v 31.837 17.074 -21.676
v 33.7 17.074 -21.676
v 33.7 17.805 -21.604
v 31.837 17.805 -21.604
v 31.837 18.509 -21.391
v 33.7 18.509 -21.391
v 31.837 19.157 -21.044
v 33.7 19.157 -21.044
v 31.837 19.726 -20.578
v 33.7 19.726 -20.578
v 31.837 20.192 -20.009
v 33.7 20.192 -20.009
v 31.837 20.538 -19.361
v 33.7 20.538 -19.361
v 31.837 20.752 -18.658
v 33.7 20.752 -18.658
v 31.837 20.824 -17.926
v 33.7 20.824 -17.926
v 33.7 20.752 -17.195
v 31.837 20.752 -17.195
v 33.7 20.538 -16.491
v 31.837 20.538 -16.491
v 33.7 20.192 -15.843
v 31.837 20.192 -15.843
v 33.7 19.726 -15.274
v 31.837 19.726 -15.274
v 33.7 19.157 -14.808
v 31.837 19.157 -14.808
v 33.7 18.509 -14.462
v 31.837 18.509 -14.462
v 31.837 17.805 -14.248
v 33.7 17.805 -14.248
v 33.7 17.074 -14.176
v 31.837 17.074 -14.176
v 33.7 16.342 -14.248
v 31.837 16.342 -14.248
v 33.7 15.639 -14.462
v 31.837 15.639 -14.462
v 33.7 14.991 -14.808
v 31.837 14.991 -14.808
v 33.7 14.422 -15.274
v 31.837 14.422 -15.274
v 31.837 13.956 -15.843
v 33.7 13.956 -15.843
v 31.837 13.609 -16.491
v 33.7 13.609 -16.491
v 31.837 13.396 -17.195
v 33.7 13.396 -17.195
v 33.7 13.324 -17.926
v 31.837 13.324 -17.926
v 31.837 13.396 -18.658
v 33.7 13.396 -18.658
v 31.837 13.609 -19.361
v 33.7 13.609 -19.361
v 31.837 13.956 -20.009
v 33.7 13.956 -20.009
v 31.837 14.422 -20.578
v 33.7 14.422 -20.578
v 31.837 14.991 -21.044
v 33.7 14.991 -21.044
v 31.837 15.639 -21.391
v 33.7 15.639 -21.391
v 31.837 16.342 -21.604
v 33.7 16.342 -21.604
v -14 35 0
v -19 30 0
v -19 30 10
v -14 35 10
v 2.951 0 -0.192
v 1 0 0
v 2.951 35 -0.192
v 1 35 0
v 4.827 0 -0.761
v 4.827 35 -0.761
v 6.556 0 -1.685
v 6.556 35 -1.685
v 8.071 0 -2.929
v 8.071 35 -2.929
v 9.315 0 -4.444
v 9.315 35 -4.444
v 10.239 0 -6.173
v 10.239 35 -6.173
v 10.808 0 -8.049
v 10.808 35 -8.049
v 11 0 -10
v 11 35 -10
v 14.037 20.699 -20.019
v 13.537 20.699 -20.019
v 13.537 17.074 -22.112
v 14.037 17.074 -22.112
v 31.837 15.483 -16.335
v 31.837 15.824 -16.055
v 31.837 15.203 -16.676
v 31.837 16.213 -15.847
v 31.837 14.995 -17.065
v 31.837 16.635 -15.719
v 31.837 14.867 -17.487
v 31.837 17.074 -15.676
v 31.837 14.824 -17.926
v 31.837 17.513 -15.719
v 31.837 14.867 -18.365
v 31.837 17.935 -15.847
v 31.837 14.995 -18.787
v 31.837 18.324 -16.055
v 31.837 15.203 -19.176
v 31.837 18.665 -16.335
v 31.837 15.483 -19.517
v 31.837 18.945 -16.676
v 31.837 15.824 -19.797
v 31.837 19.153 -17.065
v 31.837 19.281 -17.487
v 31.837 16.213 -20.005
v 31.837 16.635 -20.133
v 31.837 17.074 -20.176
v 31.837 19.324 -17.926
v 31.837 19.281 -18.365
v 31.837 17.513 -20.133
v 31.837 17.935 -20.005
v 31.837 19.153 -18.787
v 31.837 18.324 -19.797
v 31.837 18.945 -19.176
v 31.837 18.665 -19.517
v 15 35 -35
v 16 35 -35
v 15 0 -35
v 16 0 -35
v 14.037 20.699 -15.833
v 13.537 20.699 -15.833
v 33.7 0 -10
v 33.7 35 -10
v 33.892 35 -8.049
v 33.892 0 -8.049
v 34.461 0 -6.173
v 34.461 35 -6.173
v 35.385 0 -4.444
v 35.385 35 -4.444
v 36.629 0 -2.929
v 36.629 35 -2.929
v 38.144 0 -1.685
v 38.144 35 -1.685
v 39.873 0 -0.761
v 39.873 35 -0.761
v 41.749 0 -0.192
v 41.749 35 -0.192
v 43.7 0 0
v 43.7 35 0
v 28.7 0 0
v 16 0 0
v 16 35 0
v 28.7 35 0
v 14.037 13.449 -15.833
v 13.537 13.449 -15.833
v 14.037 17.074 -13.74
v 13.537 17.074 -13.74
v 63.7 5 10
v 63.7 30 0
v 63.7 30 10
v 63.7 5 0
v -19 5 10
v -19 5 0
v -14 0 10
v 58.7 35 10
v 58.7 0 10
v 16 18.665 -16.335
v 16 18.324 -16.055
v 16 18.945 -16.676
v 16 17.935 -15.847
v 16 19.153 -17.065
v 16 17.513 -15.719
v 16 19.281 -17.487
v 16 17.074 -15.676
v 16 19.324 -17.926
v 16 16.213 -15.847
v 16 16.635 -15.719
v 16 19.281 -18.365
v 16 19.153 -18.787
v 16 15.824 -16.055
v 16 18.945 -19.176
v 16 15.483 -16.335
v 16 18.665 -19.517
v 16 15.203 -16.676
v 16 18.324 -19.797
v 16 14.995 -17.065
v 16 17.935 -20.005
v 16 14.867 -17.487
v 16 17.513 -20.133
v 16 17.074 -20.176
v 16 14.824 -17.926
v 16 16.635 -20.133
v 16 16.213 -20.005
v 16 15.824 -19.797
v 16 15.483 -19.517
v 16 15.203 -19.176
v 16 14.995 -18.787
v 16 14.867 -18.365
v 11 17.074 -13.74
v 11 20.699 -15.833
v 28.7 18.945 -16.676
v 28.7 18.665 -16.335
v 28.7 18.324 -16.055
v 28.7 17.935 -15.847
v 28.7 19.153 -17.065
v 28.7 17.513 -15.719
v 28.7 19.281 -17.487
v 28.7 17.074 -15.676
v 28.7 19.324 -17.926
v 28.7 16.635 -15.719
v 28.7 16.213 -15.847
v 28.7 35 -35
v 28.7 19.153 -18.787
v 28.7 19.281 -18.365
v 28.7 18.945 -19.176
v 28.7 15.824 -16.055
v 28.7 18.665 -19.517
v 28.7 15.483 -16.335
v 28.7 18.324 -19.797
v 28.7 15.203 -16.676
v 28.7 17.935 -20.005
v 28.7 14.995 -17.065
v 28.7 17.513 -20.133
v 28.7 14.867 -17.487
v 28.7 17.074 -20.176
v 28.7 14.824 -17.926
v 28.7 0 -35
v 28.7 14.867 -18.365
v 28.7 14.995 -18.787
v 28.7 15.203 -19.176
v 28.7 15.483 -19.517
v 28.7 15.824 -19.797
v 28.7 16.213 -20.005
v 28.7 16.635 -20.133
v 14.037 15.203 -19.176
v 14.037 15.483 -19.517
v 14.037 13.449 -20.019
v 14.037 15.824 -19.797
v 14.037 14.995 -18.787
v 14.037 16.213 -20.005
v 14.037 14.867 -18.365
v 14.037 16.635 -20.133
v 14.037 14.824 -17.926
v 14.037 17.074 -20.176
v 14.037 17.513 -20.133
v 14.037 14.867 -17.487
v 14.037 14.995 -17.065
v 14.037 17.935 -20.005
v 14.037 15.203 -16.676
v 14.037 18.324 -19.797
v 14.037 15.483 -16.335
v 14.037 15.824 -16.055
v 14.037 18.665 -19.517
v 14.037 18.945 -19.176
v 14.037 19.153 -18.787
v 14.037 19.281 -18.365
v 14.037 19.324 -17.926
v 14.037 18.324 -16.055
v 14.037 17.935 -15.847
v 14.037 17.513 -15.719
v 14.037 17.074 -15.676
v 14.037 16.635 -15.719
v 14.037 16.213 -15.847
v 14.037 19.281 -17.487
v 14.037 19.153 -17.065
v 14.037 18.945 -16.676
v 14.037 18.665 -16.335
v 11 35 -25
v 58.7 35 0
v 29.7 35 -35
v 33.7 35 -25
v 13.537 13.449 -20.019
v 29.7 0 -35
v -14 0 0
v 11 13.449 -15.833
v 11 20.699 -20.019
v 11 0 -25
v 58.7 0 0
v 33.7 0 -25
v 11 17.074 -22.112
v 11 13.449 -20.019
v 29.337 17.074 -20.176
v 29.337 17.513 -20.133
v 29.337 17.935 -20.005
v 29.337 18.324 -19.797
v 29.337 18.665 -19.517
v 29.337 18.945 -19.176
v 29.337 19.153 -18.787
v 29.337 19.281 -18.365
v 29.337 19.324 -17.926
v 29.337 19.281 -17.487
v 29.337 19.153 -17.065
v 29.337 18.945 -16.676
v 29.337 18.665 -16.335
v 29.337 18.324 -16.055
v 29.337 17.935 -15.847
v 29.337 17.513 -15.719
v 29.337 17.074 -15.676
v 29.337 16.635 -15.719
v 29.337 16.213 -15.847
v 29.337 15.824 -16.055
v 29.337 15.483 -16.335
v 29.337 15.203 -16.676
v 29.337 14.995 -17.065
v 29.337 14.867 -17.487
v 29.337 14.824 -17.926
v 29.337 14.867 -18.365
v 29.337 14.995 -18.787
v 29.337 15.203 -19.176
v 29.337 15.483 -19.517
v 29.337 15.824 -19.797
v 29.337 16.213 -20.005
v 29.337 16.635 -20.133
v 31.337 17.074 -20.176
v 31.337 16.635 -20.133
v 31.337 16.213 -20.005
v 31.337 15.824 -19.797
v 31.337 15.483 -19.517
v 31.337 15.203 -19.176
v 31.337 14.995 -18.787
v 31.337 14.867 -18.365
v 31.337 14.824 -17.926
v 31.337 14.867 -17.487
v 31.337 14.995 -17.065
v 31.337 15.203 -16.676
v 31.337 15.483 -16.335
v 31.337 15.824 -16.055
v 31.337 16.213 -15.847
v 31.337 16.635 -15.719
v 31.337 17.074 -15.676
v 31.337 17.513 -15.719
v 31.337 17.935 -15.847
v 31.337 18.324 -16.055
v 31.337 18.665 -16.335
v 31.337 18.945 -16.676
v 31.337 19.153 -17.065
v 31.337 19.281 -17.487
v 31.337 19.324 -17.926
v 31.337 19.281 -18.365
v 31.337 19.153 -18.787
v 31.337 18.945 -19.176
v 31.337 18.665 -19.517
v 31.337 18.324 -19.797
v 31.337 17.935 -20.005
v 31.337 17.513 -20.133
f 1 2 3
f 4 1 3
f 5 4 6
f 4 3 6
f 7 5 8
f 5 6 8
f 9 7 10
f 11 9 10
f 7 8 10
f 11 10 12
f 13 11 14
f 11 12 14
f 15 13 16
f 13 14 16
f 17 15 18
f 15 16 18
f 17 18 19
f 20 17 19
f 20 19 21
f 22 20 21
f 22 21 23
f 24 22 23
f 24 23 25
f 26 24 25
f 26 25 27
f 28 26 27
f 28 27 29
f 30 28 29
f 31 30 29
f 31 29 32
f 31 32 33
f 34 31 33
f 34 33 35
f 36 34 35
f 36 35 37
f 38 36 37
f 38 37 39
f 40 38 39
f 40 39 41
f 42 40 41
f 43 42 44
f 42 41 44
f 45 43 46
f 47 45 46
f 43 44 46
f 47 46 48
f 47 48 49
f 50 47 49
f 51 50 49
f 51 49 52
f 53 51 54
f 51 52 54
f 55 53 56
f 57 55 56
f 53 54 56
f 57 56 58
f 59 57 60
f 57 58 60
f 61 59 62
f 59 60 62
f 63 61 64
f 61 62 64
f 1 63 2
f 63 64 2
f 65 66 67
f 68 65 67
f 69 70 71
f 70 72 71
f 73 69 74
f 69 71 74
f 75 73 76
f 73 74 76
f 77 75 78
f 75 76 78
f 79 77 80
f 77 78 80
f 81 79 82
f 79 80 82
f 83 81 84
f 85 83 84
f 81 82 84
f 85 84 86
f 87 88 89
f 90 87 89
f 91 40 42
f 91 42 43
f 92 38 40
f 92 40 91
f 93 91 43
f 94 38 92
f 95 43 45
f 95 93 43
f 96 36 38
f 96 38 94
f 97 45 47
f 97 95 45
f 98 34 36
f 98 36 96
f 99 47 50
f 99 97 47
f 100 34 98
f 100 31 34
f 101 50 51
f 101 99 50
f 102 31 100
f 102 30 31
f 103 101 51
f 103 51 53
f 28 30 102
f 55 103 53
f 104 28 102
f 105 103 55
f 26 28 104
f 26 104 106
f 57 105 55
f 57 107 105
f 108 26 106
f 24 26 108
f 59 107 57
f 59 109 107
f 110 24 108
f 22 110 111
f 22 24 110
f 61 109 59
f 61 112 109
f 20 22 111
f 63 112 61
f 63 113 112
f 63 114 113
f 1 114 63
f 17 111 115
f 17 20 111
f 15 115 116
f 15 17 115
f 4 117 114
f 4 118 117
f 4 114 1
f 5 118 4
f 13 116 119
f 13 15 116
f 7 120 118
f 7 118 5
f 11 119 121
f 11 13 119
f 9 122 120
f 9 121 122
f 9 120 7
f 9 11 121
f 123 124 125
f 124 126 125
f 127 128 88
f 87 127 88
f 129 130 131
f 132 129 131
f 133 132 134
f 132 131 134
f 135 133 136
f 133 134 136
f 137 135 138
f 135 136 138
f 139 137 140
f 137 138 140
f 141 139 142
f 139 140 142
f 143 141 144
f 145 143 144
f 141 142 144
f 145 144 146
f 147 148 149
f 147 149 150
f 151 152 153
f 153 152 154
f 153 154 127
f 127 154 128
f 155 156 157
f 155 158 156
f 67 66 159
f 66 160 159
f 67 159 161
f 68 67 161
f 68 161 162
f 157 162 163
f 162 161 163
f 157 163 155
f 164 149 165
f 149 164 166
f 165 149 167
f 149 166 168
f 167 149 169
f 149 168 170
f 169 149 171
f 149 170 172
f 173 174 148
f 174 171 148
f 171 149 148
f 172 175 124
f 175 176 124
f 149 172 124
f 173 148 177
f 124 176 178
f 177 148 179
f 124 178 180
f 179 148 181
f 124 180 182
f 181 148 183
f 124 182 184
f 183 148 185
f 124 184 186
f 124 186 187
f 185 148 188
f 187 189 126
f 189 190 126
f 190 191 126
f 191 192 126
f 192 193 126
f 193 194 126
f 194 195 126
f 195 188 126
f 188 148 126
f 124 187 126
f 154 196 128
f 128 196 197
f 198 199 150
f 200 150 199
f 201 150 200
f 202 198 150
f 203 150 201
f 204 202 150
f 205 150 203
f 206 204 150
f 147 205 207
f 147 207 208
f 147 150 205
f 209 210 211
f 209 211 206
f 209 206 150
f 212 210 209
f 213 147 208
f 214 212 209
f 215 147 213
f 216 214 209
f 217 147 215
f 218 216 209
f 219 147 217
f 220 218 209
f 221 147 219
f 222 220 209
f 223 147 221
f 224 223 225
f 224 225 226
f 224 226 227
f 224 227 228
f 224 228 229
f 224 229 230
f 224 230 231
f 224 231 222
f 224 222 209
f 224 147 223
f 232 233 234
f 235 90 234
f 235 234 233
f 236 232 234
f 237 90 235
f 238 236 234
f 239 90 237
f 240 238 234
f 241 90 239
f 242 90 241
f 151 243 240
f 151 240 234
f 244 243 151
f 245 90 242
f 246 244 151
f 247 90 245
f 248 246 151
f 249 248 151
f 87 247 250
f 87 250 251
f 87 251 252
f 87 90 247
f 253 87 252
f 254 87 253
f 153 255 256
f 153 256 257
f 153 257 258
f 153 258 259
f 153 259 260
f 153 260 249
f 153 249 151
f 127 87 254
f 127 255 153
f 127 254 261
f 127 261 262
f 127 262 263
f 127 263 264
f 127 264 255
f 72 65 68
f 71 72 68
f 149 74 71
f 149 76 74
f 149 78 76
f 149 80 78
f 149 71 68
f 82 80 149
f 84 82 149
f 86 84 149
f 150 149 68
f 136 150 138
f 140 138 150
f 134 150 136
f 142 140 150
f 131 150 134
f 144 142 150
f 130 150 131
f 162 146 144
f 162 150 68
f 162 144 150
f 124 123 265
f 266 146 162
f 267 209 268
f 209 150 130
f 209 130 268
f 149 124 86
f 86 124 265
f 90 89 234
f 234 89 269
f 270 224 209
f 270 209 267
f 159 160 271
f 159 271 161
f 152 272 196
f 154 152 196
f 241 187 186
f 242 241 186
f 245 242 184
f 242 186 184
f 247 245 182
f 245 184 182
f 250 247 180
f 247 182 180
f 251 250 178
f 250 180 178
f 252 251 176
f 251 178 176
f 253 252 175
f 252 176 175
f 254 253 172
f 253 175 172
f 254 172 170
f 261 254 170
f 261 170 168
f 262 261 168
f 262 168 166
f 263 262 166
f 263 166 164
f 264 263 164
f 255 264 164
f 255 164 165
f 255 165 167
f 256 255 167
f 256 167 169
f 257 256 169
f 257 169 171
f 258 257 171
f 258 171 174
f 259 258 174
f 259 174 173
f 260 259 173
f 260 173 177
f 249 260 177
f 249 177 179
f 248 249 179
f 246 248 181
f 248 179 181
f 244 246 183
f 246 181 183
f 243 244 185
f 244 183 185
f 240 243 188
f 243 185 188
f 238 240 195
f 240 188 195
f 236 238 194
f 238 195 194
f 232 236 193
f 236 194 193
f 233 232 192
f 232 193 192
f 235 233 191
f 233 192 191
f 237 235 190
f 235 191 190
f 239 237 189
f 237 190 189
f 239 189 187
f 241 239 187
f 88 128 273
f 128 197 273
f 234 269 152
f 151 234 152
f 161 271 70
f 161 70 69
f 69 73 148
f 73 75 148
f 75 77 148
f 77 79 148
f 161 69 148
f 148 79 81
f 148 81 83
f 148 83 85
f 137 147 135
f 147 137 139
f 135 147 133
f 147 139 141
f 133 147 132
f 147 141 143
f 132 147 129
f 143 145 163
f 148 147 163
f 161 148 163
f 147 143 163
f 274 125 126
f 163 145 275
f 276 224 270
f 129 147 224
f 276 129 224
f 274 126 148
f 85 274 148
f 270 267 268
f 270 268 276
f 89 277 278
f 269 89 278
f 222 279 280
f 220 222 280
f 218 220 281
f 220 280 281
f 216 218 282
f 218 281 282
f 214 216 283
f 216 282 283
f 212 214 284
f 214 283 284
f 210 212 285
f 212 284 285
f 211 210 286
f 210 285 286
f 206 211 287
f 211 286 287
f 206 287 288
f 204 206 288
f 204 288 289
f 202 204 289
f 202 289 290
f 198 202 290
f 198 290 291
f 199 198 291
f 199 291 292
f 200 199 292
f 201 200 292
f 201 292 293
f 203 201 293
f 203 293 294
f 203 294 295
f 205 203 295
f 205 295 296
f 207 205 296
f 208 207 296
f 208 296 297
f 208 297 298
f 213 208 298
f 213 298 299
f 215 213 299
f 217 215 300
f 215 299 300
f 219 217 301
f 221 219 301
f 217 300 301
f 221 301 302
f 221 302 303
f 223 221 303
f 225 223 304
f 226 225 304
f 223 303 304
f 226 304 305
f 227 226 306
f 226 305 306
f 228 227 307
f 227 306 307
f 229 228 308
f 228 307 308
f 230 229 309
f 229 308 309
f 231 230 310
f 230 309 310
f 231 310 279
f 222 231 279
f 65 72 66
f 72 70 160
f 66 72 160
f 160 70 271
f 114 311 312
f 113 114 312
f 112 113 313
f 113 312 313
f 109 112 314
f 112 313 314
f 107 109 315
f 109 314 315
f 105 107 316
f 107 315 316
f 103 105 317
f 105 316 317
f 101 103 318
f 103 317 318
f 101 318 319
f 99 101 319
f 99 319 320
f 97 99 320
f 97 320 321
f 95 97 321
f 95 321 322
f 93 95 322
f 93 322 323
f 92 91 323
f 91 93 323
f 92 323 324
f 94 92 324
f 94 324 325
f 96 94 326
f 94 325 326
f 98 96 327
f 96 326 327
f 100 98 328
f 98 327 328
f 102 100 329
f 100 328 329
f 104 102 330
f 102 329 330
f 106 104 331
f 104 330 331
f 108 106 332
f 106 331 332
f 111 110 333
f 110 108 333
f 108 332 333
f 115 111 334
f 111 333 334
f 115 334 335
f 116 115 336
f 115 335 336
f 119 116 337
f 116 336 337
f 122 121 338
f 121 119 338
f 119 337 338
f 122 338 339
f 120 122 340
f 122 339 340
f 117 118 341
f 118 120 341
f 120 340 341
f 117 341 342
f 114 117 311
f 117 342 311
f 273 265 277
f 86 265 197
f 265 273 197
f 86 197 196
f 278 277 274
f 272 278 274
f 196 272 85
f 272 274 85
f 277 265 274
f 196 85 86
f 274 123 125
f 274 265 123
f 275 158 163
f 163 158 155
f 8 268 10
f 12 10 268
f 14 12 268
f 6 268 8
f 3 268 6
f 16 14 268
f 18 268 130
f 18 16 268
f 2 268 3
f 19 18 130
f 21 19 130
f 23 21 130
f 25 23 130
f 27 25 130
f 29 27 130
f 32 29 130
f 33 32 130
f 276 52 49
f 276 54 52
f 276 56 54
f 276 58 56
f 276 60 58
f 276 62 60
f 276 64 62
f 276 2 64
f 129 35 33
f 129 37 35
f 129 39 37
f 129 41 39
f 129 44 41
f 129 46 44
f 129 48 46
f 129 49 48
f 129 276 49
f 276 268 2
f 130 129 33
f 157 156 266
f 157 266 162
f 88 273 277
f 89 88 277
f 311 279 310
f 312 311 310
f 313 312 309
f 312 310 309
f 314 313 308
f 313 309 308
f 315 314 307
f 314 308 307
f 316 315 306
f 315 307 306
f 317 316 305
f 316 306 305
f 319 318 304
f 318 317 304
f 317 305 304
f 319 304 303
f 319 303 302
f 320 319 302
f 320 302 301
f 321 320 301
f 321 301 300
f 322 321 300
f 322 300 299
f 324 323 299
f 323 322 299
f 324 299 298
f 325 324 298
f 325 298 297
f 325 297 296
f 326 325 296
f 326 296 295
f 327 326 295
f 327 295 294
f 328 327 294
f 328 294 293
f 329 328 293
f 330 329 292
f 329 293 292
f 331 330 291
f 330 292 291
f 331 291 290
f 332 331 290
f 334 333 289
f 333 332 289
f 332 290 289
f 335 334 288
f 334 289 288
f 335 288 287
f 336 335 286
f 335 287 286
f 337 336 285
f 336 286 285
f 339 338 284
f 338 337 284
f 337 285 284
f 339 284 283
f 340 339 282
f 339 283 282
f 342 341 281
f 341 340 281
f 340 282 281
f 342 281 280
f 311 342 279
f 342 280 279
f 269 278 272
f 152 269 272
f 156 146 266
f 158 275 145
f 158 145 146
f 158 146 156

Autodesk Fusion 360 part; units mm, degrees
sketch "Sketch1" plane through (0, 0, 0) normal (0, 1, 0) x (1, 0, 0)
  line L0 (16, 0) -> (16, 35)
  line L1 (28.7, 0) -> (28.7, 35)
  line L2 (16, 35) -> (11, 35)
  line L3 (11, 35) -> (11, 0)
  line L4 (16, 0) -> (28.7, 0)
  line L5 (28.7, 35) -> (33.7, 35)
  line L6 (33.7, 35) -> (33.7, 0)
  line L7 (33.7, 0) -> (63.7, 0)
  line L8 (63.7, 0) -> (63.7, -10)
  line L9 (11, 0) -> (-19, 0)
  line L10 (-19, 0) -> (-19, -10)
  line L11 (-19, -10) -> (63.7, -10)
  dimension "d2" = 12.7
  dimension "d3" = 5
  dimension "d4" = 5
  dimension "d5" = 30
  dimension "d6" = 10
  dimension "d7" = 30
  dimension "d8" = 10
  dimension "d16" = 35
extrude "Extrude1" add sketch "Sketch1" along normal blind 35
sketch "Sketch2" plane through (33.7, 0, 0) normal (1, 0, 0) x (0, 0, -1)
  line L0 (0, 0) -> (35, 0)
  line L1 (35, 0) -> (35, 35)
  line L2 (35, 35) -> (0, 35)
  line L3 (0, 35) -> (0, 0)
  circle A0 centre (17.9261, 17.0739) radius 2.25
  line L4 (0, 35) -> (16.3351, 18.6649)
  line L5 (19.5171, 15.4829) -> (35, 0)
  line L6 (35, 35) -> (19.0329, 19.0329)
  line L7 (15.9671, 15.9671) -> (0, 0)
  dimension "d11" = 4.5
extrude "Extrude2" cut sketch "Sketch2" against normal blind 59 contours A0
ref_plane "WorkPlane1" through (22.35, 17.5, -12.5) normal (0, 1, 0) x (0, 0, 1)
sketch "Sketch3" plane through (0, 17.5, 0) normal (0, 1, 0) x (1, 0, 0)
  line L0 (-20, 0) -> (5, 0)
  line L1 (5, 0) -> (5, -10)
  line L2 (5, -10) -> (-20, -10)
  line L3 (-20, -10) -> (-20, 0)
  line L4 (44, 0) -> (44.05, 0)
  line L5 (33.7, 0) -> (33.7, 35)
  dimension "d14" = 25
sketch "Sketch4" plane through (11, 0, 0) normal (-1, 0, 0) x (0, 0, 1)
  circle A0 centre (-17.9261, 17.0739) radius 2.25 construction
  line L0 (-35, 0) -> (0, 0)
  line L1 (0, 0) -> (0, 35)
  line L2 (0, 35) -> (-35, 35)
  line L3 (-35, 35) -> (-35, 0)
  line L4 (-15.8332, 13.4489) -> (-13.7403, 17.0739)
  line L5 (-13.7403, 17.0739) -> (-15.8332, 20.6989)
  line L6 (-15.8332, 20.6989) -> (-20.019, 20.6989)
  line L7 (-20.019, 20.6989) -> (-22.1119, 17.0739)
  line L8 (-22.1119, 17.0739) -> (-20.019, 13.4489)
  line L9 (-20.019, 13.4489) -> (-15.8332, 13.4489)
  point P0 (-17.9261, 17.0739)
  dimension "d18" = 7.25
extrude "Extrude3" cut sketch "Sketch4" against normal blind 3 contours L4 L5 L6 L7 L8 L9
chamfer "Chamfer1" distance 5 angle 45 4 edges at (63.7, 0, 5) (63.7, 35, 5) (-19, 35, 5) (-19, 0, 5)
sketch "Sketch5" plane through (33.7, 0, 0) normal (1, 0, 0) x (0, 0, -1)
  circle A0 centre (17.9261, 17.0739) radius 2.25
  line L0 (0, 0) -> (35, 0)
  line L1 (35, 0) -> (35, 35)
  line L2 (35, 35) -> (0, 35)
  circle A1 centre (17.9261, 17.0739) radius 2.25
  circle A2 centre (17.9261, 17.0739) radius 3.75
  line L3 (0, 35) -> (0, 0)
  dimension "d24" = 7.5
extrude "Extrude4" cut sketch "Sketch5" against normal blind 3.7 contours A2
extrude "Extrude5" cut 1 faces at (14, 18.6077, -15.1575) along direction (1, 0, 0) blind 0.037
extrude "Extrude6" cut 1 faces at (30, 16.7758, -21.1538) along direction (-1, 0, 0) blind 0.663
chamfer "Chamfer2" distance 4 distance2 10 1 edges at (11, 17.5, -35) measured on face at (14.3333, 11.6667, -35)
chamfer "Chamfer2" distance 10 distance2 4 1 edges at (33.7, 17.5, -35) measured on face at (33.7, 30.2711, -17.5486)
extrude "Extrude7" add 1 faces at (14.037, 18.6077, -15.1575) along direction (-1, 0, 0) blind 0.5
extrude "Extrude8" add 1 faces at (29.337, 16.7758, -21.1538) along direction (1, 0, 0) blind 2
extrude "Extrude9" cut 1 faces at (13.537, 18.6077, -15.1575) along direction (1, 0, 0) blind 0.5
extrude "Extrude10" add 1 faces at (31.337, 16.7758, -21.1538) along direction (1, 0, 0) blind 0.5
fillet "Fillet1" radius 10 2 edges at (33.7, 17.5, 0) (11, 17.5, 0)
equation "d5 = d7"
